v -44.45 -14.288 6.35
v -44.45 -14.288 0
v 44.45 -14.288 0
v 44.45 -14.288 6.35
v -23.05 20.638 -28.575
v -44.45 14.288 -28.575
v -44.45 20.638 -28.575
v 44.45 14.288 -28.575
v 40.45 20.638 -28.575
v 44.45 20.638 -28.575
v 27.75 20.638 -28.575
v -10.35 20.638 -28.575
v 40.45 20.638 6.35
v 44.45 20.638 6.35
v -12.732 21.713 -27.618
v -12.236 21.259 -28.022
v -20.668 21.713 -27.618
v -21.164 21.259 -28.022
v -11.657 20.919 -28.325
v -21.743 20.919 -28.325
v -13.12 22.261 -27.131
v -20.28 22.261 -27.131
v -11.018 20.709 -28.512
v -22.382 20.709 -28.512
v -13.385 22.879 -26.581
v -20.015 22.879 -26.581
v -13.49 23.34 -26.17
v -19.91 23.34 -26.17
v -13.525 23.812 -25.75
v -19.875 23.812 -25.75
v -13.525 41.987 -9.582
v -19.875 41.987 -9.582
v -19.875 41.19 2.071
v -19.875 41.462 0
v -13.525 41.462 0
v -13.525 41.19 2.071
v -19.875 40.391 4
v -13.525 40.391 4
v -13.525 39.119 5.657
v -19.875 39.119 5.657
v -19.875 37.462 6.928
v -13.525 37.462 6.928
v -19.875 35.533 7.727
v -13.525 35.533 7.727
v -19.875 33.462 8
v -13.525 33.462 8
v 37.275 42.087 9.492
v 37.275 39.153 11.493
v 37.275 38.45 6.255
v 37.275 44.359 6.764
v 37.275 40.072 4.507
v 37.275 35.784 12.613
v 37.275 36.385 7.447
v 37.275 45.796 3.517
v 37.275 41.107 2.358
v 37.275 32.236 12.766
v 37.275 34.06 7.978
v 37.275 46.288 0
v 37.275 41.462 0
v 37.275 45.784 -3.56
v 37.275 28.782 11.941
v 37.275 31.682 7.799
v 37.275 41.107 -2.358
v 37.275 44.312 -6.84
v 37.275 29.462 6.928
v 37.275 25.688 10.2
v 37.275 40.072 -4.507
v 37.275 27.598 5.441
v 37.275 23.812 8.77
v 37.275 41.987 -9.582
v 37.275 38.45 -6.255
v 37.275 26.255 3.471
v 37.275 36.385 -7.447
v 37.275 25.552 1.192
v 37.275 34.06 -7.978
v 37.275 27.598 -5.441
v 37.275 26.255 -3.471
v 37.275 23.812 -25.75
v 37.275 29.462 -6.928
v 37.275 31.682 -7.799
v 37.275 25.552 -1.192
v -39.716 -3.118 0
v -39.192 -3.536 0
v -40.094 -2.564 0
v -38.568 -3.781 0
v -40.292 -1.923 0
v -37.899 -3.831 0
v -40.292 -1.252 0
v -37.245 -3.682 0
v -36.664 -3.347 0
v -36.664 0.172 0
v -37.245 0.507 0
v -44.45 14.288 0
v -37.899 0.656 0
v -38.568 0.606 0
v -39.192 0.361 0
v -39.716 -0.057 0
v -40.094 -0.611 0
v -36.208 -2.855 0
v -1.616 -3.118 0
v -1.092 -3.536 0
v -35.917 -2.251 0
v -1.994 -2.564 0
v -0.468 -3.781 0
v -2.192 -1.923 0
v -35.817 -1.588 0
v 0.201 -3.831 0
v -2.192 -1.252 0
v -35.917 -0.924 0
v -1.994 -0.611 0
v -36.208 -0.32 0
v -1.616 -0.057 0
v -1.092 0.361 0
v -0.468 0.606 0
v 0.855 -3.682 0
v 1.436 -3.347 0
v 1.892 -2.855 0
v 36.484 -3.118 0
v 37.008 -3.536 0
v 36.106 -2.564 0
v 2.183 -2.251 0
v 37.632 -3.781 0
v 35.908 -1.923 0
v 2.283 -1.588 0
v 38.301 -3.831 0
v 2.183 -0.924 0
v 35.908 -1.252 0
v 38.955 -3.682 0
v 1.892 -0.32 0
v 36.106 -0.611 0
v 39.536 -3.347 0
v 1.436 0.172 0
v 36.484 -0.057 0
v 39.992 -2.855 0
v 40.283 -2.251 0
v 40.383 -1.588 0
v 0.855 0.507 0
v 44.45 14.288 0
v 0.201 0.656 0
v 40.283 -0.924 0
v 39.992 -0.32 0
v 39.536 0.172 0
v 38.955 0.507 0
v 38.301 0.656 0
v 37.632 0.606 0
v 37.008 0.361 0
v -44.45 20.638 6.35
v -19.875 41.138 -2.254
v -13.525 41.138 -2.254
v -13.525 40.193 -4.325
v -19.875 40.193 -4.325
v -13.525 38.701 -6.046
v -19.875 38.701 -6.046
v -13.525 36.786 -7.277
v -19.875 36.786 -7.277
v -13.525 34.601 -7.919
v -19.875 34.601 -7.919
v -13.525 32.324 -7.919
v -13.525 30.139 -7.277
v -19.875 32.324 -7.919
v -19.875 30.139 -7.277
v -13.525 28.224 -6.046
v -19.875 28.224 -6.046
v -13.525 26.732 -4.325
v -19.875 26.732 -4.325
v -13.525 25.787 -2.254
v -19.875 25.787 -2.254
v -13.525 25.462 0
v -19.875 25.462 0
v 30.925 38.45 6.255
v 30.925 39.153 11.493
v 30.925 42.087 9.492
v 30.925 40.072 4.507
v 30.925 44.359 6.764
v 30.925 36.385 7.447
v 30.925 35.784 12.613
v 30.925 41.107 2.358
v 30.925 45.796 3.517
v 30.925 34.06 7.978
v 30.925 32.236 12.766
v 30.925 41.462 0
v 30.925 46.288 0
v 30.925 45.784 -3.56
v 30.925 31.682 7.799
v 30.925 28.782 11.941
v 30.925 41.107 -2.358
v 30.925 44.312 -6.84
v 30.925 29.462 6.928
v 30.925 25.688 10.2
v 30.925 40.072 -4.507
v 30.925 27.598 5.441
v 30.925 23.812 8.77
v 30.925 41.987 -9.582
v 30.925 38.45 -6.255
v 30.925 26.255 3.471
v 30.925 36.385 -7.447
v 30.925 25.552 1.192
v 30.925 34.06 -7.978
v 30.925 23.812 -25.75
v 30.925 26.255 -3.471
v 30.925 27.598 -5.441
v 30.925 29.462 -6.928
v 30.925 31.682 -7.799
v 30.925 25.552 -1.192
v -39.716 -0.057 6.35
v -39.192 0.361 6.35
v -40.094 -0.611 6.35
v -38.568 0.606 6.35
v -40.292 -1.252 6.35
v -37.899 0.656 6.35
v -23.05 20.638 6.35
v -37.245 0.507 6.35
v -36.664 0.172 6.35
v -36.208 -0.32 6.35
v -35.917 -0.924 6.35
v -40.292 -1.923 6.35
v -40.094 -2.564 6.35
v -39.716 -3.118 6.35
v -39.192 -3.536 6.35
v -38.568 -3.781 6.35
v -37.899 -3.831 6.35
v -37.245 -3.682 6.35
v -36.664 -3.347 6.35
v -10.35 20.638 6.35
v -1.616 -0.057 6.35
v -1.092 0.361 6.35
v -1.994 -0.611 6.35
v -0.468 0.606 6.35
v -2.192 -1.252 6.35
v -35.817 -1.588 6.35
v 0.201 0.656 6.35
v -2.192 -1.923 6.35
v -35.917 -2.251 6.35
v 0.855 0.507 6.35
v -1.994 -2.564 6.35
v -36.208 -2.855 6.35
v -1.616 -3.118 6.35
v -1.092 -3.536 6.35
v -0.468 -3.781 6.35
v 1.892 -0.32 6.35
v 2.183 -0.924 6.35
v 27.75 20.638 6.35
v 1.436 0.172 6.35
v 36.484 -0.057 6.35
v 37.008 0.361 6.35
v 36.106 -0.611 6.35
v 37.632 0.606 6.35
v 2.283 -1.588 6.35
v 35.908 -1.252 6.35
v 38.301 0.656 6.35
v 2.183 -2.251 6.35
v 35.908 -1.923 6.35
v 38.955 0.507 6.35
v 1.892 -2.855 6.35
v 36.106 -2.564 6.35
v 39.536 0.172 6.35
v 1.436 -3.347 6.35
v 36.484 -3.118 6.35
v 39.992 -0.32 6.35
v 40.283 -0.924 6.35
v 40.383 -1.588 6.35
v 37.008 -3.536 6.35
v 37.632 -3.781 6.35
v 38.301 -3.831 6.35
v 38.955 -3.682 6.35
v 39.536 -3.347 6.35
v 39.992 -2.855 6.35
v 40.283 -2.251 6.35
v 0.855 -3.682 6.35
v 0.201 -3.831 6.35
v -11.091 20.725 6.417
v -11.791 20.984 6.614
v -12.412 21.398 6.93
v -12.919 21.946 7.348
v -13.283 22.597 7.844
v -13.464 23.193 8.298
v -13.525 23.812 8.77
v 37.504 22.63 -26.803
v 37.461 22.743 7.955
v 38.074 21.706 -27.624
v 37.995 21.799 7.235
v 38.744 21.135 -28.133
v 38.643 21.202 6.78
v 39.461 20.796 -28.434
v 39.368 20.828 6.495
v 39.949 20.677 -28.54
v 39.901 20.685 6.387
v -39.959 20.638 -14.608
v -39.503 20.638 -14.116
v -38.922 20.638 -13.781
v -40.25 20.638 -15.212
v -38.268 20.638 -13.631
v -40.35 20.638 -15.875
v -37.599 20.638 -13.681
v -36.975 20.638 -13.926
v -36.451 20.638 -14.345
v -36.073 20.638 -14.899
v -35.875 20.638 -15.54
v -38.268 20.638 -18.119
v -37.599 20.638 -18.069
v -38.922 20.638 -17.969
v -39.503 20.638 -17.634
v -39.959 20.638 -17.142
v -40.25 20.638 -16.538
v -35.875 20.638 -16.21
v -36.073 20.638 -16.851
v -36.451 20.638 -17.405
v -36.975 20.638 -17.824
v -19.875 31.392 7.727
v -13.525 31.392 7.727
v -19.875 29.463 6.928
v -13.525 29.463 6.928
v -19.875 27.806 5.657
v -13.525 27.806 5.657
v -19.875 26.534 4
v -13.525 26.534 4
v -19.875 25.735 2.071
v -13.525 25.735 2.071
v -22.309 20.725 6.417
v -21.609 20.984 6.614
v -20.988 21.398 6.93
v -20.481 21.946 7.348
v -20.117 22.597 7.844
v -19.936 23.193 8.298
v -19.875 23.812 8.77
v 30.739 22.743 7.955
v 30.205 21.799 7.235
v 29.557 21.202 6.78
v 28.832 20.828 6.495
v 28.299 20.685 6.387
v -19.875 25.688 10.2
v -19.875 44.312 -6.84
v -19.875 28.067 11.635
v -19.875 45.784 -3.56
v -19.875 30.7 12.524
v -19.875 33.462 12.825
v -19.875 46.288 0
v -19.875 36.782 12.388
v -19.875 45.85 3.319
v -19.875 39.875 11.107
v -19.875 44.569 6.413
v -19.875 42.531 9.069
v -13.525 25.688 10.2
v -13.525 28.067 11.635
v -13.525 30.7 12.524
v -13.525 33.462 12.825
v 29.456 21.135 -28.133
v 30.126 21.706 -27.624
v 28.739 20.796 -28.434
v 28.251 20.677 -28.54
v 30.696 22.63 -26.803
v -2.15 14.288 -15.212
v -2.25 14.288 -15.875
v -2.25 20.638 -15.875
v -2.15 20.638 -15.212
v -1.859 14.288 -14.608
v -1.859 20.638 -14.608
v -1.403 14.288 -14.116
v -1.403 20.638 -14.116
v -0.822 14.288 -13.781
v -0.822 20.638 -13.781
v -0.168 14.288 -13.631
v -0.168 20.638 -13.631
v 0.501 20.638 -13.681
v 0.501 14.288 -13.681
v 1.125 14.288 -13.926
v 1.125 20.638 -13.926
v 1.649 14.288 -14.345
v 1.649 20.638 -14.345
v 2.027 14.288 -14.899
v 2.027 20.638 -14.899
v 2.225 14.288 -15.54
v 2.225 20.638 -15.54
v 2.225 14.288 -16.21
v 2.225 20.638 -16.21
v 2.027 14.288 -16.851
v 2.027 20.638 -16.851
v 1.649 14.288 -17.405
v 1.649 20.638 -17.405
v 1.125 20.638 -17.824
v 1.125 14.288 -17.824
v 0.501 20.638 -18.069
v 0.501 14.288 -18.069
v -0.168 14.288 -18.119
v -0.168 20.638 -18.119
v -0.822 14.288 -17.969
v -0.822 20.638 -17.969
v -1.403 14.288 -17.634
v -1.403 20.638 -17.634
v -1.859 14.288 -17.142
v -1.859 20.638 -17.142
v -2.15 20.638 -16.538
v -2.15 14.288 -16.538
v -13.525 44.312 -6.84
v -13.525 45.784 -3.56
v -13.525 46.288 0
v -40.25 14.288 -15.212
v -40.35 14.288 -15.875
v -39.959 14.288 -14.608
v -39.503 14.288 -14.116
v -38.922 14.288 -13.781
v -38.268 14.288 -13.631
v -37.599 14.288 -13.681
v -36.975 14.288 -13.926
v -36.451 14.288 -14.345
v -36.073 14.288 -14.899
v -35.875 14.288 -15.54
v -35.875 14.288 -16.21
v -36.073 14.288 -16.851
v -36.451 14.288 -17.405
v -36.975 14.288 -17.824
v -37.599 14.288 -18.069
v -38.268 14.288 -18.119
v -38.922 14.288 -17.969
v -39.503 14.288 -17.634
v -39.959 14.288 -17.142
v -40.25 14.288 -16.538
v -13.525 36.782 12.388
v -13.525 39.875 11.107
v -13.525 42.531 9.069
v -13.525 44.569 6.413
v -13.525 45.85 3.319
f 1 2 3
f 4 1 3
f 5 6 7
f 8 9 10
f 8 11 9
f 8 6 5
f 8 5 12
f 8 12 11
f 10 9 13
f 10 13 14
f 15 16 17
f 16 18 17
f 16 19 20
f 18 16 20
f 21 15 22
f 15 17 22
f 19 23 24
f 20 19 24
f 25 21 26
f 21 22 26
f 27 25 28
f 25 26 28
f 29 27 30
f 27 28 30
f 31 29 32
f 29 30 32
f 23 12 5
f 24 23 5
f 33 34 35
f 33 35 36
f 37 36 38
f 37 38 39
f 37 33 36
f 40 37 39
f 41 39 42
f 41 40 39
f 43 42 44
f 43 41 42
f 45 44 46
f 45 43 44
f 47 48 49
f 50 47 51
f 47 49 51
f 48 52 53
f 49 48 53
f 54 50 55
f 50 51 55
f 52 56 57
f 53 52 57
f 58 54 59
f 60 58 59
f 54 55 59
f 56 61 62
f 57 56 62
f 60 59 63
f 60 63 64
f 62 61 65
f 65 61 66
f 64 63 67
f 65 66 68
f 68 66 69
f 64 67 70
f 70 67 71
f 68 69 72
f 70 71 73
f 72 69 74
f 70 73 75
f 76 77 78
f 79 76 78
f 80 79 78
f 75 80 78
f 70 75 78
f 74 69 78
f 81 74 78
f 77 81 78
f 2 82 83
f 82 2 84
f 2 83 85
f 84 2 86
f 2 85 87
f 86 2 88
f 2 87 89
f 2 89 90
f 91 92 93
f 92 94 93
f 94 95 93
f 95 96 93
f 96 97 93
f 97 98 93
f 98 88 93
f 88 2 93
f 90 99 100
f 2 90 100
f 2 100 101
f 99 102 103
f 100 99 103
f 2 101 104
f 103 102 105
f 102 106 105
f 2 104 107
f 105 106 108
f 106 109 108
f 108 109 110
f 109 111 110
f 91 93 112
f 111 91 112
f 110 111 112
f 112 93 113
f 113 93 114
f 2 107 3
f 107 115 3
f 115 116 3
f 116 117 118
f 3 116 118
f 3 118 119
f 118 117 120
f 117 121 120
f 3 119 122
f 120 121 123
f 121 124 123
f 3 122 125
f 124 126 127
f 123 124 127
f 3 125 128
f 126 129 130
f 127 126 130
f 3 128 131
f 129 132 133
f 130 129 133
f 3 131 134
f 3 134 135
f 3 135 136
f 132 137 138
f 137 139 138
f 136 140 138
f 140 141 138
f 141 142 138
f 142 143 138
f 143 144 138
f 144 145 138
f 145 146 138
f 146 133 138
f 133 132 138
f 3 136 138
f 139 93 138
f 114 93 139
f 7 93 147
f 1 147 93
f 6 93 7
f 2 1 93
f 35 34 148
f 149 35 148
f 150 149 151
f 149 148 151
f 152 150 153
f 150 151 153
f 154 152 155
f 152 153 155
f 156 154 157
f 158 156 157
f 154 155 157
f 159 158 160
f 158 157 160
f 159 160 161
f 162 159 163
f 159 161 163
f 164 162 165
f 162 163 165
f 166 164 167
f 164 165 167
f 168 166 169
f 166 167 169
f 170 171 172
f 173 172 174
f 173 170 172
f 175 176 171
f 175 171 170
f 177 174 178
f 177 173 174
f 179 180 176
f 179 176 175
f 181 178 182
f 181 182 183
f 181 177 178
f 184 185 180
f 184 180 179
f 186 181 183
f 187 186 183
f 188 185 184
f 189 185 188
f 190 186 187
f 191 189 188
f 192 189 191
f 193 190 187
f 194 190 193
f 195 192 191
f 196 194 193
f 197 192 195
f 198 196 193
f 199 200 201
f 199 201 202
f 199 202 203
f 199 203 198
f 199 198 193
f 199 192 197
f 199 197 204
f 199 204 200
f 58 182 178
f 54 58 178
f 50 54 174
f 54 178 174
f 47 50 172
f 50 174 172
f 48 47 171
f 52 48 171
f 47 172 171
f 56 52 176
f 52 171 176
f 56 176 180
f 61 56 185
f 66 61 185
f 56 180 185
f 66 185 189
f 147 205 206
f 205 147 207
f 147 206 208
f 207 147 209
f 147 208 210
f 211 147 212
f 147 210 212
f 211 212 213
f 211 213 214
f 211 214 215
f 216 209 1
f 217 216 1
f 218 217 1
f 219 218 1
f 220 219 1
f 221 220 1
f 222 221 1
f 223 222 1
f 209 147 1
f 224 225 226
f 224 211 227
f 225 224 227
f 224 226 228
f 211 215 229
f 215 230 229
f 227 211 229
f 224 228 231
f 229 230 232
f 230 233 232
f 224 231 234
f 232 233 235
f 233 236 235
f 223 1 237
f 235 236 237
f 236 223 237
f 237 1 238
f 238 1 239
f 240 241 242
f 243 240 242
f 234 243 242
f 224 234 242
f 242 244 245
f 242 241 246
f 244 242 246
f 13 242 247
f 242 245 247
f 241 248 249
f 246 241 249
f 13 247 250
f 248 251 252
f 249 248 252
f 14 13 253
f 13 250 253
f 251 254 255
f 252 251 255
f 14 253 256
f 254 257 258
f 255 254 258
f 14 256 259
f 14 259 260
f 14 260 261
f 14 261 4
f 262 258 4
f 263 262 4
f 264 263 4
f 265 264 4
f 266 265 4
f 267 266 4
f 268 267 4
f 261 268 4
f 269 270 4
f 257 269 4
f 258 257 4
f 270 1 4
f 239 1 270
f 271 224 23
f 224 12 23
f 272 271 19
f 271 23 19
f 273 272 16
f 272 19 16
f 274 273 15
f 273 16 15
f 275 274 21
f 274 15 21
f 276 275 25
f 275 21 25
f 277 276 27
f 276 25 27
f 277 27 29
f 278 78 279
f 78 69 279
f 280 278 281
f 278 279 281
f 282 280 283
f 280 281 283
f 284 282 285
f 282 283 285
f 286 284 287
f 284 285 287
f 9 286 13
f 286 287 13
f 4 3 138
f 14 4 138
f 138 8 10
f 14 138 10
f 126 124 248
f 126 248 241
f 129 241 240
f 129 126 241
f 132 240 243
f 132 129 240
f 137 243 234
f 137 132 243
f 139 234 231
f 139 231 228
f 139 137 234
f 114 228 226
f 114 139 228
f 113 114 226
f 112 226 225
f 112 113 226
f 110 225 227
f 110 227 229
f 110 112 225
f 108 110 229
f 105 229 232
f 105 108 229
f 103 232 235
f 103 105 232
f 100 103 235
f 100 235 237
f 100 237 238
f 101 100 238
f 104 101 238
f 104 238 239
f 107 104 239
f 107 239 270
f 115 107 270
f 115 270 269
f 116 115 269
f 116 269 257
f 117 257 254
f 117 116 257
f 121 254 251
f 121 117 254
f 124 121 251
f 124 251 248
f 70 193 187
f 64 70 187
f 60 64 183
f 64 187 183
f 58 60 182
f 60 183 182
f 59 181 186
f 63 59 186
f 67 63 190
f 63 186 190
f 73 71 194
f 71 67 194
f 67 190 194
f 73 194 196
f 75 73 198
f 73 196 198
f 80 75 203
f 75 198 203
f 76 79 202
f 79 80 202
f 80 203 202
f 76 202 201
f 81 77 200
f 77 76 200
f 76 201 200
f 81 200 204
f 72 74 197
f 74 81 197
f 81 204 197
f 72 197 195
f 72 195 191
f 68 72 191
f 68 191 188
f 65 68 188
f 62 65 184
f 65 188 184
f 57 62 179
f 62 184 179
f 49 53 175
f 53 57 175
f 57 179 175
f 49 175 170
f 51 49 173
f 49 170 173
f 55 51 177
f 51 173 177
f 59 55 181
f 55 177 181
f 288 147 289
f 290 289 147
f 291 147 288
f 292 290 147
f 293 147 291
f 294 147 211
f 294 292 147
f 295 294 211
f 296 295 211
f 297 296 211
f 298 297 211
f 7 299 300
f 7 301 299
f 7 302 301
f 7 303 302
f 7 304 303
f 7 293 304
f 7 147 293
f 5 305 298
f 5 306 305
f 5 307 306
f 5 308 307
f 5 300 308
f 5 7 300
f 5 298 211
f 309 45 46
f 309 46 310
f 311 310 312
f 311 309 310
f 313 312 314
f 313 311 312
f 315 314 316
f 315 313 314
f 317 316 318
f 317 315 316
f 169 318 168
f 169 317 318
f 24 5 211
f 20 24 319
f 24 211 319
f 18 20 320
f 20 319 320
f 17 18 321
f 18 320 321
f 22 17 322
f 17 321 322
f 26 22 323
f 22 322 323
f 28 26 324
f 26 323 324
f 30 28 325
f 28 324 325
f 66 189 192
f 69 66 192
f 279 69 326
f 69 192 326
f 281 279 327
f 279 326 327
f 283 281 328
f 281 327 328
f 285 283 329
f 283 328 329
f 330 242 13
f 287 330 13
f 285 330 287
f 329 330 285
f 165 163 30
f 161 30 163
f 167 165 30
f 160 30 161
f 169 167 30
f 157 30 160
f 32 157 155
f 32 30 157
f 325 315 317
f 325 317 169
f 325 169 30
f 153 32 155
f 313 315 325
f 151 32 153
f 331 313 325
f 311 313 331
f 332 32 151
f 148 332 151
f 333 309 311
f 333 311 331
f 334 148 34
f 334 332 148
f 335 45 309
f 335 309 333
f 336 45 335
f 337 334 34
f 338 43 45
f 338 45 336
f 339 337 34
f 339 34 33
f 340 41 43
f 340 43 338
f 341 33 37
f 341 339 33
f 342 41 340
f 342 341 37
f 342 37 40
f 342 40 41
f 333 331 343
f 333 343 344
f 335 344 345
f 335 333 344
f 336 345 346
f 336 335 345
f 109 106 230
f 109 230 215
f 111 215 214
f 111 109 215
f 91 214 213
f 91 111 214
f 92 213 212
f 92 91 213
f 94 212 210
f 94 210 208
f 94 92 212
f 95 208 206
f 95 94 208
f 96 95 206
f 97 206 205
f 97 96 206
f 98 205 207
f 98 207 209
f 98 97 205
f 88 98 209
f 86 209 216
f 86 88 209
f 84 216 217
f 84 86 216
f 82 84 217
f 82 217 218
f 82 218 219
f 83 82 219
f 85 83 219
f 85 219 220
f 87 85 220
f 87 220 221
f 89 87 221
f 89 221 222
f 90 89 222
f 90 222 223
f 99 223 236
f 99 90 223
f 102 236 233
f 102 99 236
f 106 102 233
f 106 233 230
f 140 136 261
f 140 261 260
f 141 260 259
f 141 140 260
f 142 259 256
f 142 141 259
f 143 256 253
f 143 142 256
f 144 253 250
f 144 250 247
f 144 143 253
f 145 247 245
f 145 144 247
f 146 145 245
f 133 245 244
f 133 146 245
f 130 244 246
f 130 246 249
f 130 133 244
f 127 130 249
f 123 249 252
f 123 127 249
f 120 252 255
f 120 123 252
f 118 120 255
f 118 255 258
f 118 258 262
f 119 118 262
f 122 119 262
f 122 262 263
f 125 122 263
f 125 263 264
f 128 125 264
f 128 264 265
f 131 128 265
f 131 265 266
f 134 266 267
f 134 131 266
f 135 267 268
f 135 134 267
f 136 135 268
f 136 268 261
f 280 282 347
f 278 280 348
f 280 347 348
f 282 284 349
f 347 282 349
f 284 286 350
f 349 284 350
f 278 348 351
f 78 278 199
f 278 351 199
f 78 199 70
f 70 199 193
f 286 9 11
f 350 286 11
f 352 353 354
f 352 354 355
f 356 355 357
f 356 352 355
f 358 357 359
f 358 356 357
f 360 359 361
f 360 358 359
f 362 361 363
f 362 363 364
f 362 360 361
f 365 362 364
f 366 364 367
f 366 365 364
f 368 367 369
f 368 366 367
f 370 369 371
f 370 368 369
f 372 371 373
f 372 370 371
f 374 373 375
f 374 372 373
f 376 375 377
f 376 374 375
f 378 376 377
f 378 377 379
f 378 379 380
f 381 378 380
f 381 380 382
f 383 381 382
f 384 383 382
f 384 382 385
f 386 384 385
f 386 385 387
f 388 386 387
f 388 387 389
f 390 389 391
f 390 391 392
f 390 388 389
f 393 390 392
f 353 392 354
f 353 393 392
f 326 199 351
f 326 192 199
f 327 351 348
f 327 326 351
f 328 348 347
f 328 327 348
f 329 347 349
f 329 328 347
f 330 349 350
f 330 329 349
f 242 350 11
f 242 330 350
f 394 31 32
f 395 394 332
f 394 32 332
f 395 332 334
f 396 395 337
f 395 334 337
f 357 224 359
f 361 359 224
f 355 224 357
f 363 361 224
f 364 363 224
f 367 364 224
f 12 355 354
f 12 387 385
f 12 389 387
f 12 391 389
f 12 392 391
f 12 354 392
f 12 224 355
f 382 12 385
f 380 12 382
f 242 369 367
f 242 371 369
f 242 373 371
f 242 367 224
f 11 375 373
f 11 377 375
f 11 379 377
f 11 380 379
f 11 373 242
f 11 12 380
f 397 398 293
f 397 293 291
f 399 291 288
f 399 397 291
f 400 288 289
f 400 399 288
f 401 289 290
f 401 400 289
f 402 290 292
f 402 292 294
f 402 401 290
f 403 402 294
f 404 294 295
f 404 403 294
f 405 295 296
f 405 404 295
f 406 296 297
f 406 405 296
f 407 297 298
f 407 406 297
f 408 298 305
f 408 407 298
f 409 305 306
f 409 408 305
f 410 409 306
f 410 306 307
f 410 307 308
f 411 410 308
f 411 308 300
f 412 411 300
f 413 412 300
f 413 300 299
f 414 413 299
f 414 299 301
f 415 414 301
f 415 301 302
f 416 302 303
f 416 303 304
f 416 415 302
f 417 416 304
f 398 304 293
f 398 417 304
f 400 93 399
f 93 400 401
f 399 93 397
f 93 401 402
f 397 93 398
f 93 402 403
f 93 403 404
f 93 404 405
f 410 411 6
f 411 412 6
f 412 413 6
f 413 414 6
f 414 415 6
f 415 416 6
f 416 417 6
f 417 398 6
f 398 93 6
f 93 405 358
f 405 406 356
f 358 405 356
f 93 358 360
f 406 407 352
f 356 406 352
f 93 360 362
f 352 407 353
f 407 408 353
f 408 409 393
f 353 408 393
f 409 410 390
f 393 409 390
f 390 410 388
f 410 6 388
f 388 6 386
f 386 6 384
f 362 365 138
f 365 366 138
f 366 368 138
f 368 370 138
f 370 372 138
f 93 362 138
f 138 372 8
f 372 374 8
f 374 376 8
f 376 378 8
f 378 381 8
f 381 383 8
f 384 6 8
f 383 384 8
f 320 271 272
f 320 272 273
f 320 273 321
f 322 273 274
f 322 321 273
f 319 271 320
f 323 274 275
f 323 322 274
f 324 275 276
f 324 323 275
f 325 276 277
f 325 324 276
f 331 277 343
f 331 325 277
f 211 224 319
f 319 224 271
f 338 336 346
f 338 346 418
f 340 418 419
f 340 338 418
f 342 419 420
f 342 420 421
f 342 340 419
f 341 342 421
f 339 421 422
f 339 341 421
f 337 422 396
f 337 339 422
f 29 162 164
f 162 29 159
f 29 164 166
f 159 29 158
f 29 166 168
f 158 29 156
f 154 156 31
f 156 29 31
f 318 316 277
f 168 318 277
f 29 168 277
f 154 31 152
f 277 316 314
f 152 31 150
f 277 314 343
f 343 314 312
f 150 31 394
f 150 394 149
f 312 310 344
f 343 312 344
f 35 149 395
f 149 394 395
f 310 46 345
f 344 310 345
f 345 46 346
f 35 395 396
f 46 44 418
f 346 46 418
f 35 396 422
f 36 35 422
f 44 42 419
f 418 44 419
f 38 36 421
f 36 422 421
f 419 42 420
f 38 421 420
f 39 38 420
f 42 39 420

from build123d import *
from build123d.topology import SkipClean

# Parameters (mm, degrees)
SKETCH1_W           = 88.9
SKETCH1_H           = 28.575
SKETCH1_R           = 2.25
BOSS_EXTRUDE1_DEPTH = 6.35
SKETCH2_W           = 24.575
SKETCH2_H           = 28.575
SKETCH2_R           = 2.25
SKETCH2_W_2         = 6.35
SKETCH2_H_2         = 6.35
SKETCH2_W_3         = 7.175
BOSS_EXTRUDE2_DEPTH = 6.35
SKETCH2_4_W         = 6.35
SKETCH2_4_H         = 28.575
BOSS_EXTRUDE3_DEPTH = 38.1
BOSS_EXTRUDE4_DEPTH = 6.35
CUT_EXTRUDE1_DEPTH  = 97.028
BOSS_EXTRUDE5_START = -6.35
BOSS_EXTRUDE5_DEPTH = 6.35
FILLET1_R           = 3.175


with BuildPart() as part:
    # Sketch1 → Boss-Extrude1 (new body)
    with BuildSketch(Plane.XY):
        Rectangle(SKETCH1_W, SKETCH1_H)
        with Locations((-38.066912716, -1.5875)):
            Circle(SKETCH1_R, mode=Mode.SUBTRACT)
        with Locations((0.033087284, -1.5875)):
            Circle(SKETCH1_R, mode=Mode.SUBTRACT)
        with Locations((38.133087284, -1.5875)):
            Circle(SKETCH1_R, mode=Mode.SUBTRACT)
    extrude(amount=BOSS_EXTRUDE1_DEPTH)

    # Sketch2 → Boss-Extrude2 (add)
    # profile 1 of 10: a face of its own
    with BuildSketch(Plane(origin=(0, 14.2875, 0), x_dir=(1, 0, 0), z_dir=(0, 1, 0))):
        with Locations((-32.1625, 14.2875)):
            Rectangle(SKETCH2_W, SKETCH2_H)
        with Locations(Location((-38.1, 15.875, 0), (0, 0, 180))):
            Circle(SKETCH2_R, mode=Mode.SUBTRACT)
    # profile 2 of 10: a face of its own
    with BuildSketch(Plane(origin=(0, 14.2875, 0), x_dir=(1, 0, 0), z_dir=(0, 1, 0))):
        with Locations((-16.7, 14.2875)):
            Rectangle(SKETCH2_W_2, SKETCH2_H)
    # profile 3 of 10: a face of its own
    with BuildSketch(Plane(origin=(0, 14.2875, 0), x_dir=(1, 0, 0), z_dir=(0, 1, 0))):
        with Locations((-32.1625, -3.175)):
            Rectangle(SKETCH2_W, SKETCH2_H_2)
    # profile 4 of 10: a face of its own
    with BuildSketch(Plane(origin=(0, 14.2875, 0), x_dir=(1, 0, 0), z_dir=(0, 1, 0))):
        with Locations((-16.7, -3.175)):
            Rectangle(SKETCH2_W_2, SKETCH2_H_2)
    # profile 5 of 10: a face of its own
    with BuildSketch(Plane(origin=(0, 14.2875, 0), x_dir=(1, 0, 0), z_dir=(0, 1, 0))):
        Polygon((-13.525, 28.575), (-13.525, 0), (30.925, 0), (30.925, 28.575), (21.4, 28.575), (-4, 28.575), align=None)
        with Locations(Location((0, 15.875, 0), (0, 0, 180))):
            Circle(SKETCH2_R, mode=Mode.SUBTRACT)
    # profile 6 of 10: a face of its own
    with BuildSketch(Plane(origin=(0, 14.2875, 0), x_dir=(1, 0, 0), z_dir=(0, 1, 0))):
        Polygon((-13.525, 0), (-13.525, -6.35), (-4, -6.35), (21.4, -6.35), (30.925, -6.35), (30.925, 0), align=None)
    # profile 7 of 10: a face of its own
    with BuildSketch(Plane(origin=(0, 14.2875, 0), x_dir=(1, 0, 0), z_dir=(0, 1, 0))):
        with Locations((34.1, 14.2875)):
            Rectangle(SKETCH2_W_2, SKETCH2_H)
    # profile 8 of 10: a face of its own
    with BuildSketch(Plane(origin=(0, 14.2875, 0), x_dir=(1, 0, 0), z_dir=(0, 1, 0))):
        with Locations((40.8625, 14.2875)):
            Rectangle(SKETCH2_W_3, SKETCH2_H)
    # profile 9 of 10: a face of its own
    with BuildSketch(Plane(origin=(0, 14.2875, 0), x_dir=(1, 0, 0), z_dir=(0, 1, 0))):
        with Locations((40.8625, -3.175)):
            Rectangle(SKETCH2_W_3, SKETCH2_H_2)
    # profile 10 of 10: a face of its own
    with BuildSketch(Plane(origin=(0, 14.2875, 0), x_dir=(1, 0, 0), z_dir=(0, 1, 0))):
        with Locations((34.1, -3.175)):
            Rectangle(SKETCH2_W_2, SKETCH2_H_2)
    extrude(amount=BOSS_EXTRUDE2_DEPTH)

    # Sketch2<4> → Boss-Extrude3 (add)
    with BuildSketch(Plane(origin=(0, 14.2875, 0), x_dir=(1, 0, 0), z_dir=(0, 1, 0))):
        with Locations((-16.7, 14.2875)):
            Rectangle(SKETCH2_4_W, SKETCH2_4_H)
        with Locations((34.1, 14.2875)):
            Rectangle(SKETCH2_4_W, SKETCH2_4_H)
    extrude(amount=BOSS_EXTRUDE3_DEPTH)

    # Sketch3 → Boss-Extrude4 (add)
    with BuildSketch(Plane.ZY.offset(19.875)):
        with BuildLine():
            ThreePointArc((0, 20.6375), (5.69066224, 21.969154609), (10.199570624, 25.687579802))
            ThreePointArc((10.199570624, 25.687579802), (12.150928324, 29.359383395), (12.825, 33.4625))
            ThreePointArc((12.825, 33.4625), (9.068644469, 42.531144469), (0, 46.2875))
            Line((0, 46.2875), (0, 41.4625))
            ThreePointArc((0, 41.4625), (5.656854249, 39.119354249), (8, 33.4625))
            ThreePointArc((8, 33.4625), (5.656854249, 27.805645751), (0, 25.4625))
            Line((0, 25.4625), (0, 20.6375))
        make_face()
        with BuildLine():
            ThreePointArc((-9.582018268, 41.986909124), (-11.700559218, 28.21106791), (0, 20.6375))
            Line((0, 20.6375), (0, 25.4625))
            ThreePointArc((0, 25.4625), (-8, 33.4625), (0, 41.4625))
            Line((0, 41.4625), (0, 46.2875))
            ThreePointArc((0, 46.2875), (-5.25143209, 45.163059218), (-9.582018268, 41.986909124))
        make_face()
        with BuildLine():
            Line((0, 20.6375), (6.35, 20.6375))
            Line((6.35, 20.6375), (10.199570624, 25.687579802))
            ThreePointArc((10.199570624, 25.687579802), (5.69066224, 21.969154609), (0, 20.6375))
        make_face()
    extrude(amount=-BOSS_EXTRUDE4_DEPTH)

    # Sketch3<4> → Cut-Extrude1 (cut)
    with SkipClean():  # the faces are left unmerged after this step: merging them gives an invalid solid
        with BuildSketch(Plane.ZY.offset(19.875)):
            with BuildLine():
                Line((-28.575, 20.6375), (-9.582018268, 41.986909124))
                ThreePointArc((-9.582018268, 41.986909124), (-5.25143209, 45.163059218), (0, 46.2875))
                Line((0, 46.2875), (0, 52.3875))
                Line((0, 52.3875), (-28.575, 52.3875))
                Line((-28.575, 52.3875), (-28.575, 20.6375))
            make_face()
            with BuildLine():
                Line((0, 41.4625), (0, 25.4625))
                ThreePointArc((0, 25.4625), (5.656854249, 27.805645751), (8, 33.4625))
                ThreePointArc((8, 33.4625), (5.656854249, 39.119354249), (0, 41.4625))
            make_face()
            with BuildLine():
                ThreePointArc((0, 41.4625), (-8, 33.4625), (0, 25.4625))
                Line((0, 25.4625), (0, 41.4625))
            make_face()
        extrude(amount=-CUT_EXTRUDE1_DEPTH, mode=Mode.SUBTRACT)

    # Sketch4 → Boss-Extrude5 (add)
    with SkipClean():  # the faces are left unmerged after this step: merging them gives an invalid solid
        with BuildSketch(Plane(origin=(37.275, 0, 0), x_dir=(0, 0, -1), z_dir=(1, 0, 0)).offset(BOSS_EXTRUDE5_START)):
            with BuildLine():
                Line((0, 46.2875), (0, 41.4625))
                ThreePointArc((0, 41.4625), (8, 33.4625), (0, 25.4625))
                Line((0, 25.4625), (0, 20.6375))
                Line((0, 20.6375), (28.575, 20.6375))
                Line((28.575, 20.6375), (9.582018268, 41.986909124))
                ThreePointArc((9.582018268, 41.986909124), (5.25143209, 45.163059218), (0, 46.2875))
            make_face()
            with BuildLine():
                Line((-6.35, 20.6375), (0, 20.6375))
                Line((0, 20.6375), (0, 25.4625))
                ThreePointArc((0, 25.4625), (-8, 33.4625), (0, 41.4625))
                Line((0, 41.4625), (0, 46.2875))
                ThreePointArc((0, 46.2875), (-11.493345391, 39.15316224), (-10.199570624, 25.687579802))
                Line((-10.199570624, 25.687579802), (-6.35, 20.6375))
            make_face()
        extrude(amount=BOSS_EXTRUDE5_DEPTH)

    # Fillet1
    fillet1_edges = [part.edges().sort_by_distance(p)[0] for p in [
        (-13.525, 20.6375, -11.1125),
        (-19.875, 20.6375, -11.1125),
        (30.925, 20.6375, -14.2875),
        (37.275, 20.6375, -14.2875),
    ]]
    fillet(fillet1_edges, radius=FILLET1_R)


solid = part.part
